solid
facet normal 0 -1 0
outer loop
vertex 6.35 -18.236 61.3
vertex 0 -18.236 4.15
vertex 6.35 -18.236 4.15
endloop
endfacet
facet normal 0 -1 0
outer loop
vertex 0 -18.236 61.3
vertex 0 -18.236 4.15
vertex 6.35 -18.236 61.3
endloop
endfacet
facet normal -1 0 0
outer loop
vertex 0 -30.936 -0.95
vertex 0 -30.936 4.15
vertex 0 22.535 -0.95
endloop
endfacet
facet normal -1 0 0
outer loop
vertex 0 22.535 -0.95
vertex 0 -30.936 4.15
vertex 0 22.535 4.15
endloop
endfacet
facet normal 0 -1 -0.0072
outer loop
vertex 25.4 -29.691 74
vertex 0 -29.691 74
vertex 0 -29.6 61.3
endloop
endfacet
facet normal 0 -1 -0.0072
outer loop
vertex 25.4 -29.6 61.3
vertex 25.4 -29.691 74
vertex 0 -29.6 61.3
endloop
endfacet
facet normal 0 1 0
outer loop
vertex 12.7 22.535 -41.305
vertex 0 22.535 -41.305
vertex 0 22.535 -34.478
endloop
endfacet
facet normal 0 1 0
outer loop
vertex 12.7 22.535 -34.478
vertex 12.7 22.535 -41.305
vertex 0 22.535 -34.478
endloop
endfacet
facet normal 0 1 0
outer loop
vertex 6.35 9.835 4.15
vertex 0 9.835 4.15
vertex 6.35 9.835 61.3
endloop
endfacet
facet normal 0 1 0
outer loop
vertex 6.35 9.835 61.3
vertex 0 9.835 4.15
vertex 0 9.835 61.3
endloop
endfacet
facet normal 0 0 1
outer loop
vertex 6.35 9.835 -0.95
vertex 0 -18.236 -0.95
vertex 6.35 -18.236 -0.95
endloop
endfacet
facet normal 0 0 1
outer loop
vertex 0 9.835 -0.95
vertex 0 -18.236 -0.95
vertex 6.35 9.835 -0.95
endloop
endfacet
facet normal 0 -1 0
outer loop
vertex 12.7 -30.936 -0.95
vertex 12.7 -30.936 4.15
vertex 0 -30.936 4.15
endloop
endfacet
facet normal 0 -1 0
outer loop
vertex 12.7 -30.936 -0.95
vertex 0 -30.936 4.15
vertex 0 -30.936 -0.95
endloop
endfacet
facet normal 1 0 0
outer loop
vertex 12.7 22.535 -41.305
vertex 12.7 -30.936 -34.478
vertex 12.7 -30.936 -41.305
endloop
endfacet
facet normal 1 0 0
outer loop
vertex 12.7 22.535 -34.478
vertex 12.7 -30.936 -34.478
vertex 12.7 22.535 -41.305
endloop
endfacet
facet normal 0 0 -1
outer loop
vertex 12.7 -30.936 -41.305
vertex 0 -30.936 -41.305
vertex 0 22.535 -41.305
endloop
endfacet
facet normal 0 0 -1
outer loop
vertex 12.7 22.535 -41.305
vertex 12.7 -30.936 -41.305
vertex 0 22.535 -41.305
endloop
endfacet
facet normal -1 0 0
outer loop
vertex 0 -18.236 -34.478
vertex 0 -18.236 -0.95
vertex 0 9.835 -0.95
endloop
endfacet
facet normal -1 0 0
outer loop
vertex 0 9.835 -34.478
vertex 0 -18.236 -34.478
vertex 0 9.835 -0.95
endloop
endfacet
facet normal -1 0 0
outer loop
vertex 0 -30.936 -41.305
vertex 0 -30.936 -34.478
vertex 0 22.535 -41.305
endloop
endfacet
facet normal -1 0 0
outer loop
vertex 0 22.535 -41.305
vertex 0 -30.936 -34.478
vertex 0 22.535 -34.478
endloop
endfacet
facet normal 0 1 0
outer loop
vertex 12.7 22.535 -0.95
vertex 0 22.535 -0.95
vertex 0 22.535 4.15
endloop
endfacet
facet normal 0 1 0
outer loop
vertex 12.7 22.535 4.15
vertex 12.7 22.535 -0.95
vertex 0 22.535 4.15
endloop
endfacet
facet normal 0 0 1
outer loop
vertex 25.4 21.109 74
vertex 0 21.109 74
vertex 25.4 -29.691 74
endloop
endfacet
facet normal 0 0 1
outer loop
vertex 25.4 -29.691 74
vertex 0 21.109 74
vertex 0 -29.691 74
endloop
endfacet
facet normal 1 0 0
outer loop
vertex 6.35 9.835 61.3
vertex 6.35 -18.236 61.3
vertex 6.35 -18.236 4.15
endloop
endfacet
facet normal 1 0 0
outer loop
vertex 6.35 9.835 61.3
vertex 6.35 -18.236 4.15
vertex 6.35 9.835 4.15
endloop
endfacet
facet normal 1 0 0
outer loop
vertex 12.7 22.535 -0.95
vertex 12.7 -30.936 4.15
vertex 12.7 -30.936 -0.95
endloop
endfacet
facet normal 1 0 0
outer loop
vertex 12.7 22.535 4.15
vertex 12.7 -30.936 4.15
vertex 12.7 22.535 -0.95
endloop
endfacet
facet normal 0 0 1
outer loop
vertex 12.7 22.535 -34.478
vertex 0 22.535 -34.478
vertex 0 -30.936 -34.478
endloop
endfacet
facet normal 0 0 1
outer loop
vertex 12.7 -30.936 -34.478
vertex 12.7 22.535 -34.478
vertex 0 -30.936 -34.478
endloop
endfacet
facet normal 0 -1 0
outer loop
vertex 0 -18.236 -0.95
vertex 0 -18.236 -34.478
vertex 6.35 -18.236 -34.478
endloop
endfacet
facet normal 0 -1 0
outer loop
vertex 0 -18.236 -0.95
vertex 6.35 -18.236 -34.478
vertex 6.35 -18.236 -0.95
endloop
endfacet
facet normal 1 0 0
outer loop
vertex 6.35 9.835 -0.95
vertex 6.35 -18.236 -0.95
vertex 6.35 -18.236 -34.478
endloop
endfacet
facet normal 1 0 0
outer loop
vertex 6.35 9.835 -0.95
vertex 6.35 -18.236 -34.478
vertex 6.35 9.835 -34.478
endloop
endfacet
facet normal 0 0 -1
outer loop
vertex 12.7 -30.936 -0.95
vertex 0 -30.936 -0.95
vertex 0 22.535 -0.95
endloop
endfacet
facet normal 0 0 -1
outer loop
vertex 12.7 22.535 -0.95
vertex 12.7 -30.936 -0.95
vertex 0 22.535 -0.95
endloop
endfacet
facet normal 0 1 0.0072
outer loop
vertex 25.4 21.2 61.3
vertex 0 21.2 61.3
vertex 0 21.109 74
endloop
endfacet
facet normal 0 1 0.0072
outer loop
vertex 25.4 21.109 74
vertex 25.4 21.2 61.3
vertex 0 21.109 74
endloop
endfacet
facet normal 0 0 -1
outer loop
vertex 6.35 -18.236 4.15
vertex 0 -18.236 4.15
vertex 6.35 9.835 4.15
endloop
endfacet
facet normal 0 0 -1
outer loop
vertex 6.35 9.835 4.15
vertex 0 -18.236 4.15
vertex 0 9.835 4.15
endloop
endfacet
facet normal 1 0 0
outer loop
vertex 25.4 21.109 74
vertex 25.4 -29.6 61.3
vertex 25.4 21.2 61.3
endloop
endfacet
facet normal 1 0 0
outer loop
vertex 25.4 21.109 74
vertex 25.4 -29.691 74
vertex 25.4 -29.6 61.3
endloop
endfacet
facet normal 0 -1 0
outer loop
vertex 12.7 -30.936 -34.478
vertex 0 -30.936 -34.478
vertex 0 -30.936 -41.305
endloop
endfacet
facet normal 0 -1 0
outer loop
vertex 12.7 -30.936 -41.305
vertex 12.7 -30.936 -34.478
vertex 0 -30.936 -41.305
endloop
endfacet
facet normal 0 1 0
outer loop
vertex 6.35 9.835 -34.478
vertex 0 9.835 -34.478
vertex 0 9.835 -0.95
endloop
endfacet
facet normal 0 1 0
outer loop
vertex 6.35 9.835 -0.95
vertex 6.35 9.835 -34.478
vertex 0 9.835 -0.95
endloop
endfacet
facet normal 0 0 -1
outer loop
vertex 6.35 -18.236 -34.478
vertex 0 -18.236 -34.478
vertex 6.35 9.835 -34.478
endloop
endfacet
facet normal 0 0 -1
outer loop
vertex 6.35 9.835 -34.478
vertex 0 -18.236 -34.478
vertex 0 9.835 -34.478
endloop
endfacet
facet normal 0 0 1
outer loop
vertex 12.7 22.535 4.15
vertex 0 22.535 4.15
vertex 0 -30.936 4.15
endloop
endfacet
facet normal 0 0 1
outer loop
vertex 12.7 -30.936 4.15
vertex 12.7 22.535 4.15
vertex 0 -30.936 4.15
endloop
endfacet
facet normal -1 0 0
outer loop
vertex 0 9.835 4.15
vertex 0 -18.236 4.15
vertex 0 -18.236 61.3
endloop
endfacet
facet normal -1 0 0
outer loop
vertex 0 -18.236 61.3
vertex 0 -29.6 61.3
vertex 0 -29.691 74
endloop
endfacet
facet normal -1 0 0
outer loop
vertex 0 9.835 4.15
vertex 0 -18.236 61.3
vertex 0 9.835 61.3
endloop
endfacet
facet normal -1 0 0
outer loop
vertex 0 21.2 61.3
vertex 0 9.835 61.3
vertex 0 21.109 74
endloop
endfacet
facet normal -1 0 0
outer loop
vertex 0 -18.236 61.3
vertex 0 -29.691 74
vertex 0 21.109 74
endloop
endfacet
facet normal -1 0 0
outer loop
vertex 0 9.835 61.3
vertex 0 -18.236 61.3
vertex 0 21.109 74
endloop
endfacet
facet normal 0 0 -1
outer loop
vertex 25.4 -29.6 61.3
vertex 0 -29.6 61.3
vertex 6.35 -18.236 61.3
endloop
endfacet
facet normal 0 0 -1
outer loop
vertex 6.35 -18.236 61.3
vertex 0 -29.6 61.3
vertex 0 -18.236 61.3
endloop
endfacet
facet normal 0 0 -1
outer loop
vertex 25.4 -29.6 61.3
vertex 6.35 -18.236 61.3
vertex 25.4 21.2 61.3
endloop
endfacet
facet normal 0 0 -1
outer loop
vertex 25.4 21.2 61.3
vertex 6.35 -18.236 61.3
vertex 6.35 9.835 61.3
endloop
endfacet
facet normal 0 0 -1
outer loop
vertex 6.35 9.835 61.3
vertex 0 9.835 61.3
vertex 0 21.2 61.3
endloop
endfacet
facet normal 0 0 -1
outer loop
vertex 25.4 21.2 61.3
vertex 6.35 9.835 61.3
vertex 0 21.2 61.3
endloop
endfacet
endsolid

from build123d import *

# Parameters (mm, degrees)
F0_W     = 28.07053
F0_H     = 57.15
F0_H_2   = 33.528
F1_DEPTH = 6.35
F2_DEPTH = 25.4
F3_DEPTH = 12.7


with BuildPart() as f1:
    # F0 (on Right) → F1 (new body)
    with BuildSketch(Plane.YZ):
        with Locations((-4.20029, 32.724945)):
            Rectangle(F0_W, F0_H)
        with Locations((-4.20029, -17.71369)):
            Rectangle(F0_W, F0_H_2)
    extrude(amount=F1_DEPTH)

    # F0 (on Right) → F2 (join)
    with BuildSketch(Plane.YZ):
        Polygon((-29.60029, 61.299945), (-18.235555, 61.299945), (9.834975, 61.299945), (21.19971, 61.299945), (21.109331, 73.999623), (-29.690669, 73.999623), align=None)
    extrude(amount=F2_DEPTH)


with BuildPart() as f3:
    # F0 (on Right) → F3 (new body)
    with BuildSketch(Plane.YZ):
        Polygon((9.834975, 4.149945), (-18.235555, 4.149945), (-30.935555, 4.149945), (-30.935555, -0.94969), (-18.235555, -0.94969), (9.834975, -0.94969), (22.534975, -0.94969), (22.534975, 4.149945), align=None)
        Polygon((9.834975, -34.47769), (-18.235555, -34.47769), (-30.935555, -34.47769), (-30.935555, -41.305362), (22.534975, -41.305362), (22.534975, -34.47769), align=None)
    extrude(amount=F3_DEPTH)


solid = Compound([f1.part, f3.part])
